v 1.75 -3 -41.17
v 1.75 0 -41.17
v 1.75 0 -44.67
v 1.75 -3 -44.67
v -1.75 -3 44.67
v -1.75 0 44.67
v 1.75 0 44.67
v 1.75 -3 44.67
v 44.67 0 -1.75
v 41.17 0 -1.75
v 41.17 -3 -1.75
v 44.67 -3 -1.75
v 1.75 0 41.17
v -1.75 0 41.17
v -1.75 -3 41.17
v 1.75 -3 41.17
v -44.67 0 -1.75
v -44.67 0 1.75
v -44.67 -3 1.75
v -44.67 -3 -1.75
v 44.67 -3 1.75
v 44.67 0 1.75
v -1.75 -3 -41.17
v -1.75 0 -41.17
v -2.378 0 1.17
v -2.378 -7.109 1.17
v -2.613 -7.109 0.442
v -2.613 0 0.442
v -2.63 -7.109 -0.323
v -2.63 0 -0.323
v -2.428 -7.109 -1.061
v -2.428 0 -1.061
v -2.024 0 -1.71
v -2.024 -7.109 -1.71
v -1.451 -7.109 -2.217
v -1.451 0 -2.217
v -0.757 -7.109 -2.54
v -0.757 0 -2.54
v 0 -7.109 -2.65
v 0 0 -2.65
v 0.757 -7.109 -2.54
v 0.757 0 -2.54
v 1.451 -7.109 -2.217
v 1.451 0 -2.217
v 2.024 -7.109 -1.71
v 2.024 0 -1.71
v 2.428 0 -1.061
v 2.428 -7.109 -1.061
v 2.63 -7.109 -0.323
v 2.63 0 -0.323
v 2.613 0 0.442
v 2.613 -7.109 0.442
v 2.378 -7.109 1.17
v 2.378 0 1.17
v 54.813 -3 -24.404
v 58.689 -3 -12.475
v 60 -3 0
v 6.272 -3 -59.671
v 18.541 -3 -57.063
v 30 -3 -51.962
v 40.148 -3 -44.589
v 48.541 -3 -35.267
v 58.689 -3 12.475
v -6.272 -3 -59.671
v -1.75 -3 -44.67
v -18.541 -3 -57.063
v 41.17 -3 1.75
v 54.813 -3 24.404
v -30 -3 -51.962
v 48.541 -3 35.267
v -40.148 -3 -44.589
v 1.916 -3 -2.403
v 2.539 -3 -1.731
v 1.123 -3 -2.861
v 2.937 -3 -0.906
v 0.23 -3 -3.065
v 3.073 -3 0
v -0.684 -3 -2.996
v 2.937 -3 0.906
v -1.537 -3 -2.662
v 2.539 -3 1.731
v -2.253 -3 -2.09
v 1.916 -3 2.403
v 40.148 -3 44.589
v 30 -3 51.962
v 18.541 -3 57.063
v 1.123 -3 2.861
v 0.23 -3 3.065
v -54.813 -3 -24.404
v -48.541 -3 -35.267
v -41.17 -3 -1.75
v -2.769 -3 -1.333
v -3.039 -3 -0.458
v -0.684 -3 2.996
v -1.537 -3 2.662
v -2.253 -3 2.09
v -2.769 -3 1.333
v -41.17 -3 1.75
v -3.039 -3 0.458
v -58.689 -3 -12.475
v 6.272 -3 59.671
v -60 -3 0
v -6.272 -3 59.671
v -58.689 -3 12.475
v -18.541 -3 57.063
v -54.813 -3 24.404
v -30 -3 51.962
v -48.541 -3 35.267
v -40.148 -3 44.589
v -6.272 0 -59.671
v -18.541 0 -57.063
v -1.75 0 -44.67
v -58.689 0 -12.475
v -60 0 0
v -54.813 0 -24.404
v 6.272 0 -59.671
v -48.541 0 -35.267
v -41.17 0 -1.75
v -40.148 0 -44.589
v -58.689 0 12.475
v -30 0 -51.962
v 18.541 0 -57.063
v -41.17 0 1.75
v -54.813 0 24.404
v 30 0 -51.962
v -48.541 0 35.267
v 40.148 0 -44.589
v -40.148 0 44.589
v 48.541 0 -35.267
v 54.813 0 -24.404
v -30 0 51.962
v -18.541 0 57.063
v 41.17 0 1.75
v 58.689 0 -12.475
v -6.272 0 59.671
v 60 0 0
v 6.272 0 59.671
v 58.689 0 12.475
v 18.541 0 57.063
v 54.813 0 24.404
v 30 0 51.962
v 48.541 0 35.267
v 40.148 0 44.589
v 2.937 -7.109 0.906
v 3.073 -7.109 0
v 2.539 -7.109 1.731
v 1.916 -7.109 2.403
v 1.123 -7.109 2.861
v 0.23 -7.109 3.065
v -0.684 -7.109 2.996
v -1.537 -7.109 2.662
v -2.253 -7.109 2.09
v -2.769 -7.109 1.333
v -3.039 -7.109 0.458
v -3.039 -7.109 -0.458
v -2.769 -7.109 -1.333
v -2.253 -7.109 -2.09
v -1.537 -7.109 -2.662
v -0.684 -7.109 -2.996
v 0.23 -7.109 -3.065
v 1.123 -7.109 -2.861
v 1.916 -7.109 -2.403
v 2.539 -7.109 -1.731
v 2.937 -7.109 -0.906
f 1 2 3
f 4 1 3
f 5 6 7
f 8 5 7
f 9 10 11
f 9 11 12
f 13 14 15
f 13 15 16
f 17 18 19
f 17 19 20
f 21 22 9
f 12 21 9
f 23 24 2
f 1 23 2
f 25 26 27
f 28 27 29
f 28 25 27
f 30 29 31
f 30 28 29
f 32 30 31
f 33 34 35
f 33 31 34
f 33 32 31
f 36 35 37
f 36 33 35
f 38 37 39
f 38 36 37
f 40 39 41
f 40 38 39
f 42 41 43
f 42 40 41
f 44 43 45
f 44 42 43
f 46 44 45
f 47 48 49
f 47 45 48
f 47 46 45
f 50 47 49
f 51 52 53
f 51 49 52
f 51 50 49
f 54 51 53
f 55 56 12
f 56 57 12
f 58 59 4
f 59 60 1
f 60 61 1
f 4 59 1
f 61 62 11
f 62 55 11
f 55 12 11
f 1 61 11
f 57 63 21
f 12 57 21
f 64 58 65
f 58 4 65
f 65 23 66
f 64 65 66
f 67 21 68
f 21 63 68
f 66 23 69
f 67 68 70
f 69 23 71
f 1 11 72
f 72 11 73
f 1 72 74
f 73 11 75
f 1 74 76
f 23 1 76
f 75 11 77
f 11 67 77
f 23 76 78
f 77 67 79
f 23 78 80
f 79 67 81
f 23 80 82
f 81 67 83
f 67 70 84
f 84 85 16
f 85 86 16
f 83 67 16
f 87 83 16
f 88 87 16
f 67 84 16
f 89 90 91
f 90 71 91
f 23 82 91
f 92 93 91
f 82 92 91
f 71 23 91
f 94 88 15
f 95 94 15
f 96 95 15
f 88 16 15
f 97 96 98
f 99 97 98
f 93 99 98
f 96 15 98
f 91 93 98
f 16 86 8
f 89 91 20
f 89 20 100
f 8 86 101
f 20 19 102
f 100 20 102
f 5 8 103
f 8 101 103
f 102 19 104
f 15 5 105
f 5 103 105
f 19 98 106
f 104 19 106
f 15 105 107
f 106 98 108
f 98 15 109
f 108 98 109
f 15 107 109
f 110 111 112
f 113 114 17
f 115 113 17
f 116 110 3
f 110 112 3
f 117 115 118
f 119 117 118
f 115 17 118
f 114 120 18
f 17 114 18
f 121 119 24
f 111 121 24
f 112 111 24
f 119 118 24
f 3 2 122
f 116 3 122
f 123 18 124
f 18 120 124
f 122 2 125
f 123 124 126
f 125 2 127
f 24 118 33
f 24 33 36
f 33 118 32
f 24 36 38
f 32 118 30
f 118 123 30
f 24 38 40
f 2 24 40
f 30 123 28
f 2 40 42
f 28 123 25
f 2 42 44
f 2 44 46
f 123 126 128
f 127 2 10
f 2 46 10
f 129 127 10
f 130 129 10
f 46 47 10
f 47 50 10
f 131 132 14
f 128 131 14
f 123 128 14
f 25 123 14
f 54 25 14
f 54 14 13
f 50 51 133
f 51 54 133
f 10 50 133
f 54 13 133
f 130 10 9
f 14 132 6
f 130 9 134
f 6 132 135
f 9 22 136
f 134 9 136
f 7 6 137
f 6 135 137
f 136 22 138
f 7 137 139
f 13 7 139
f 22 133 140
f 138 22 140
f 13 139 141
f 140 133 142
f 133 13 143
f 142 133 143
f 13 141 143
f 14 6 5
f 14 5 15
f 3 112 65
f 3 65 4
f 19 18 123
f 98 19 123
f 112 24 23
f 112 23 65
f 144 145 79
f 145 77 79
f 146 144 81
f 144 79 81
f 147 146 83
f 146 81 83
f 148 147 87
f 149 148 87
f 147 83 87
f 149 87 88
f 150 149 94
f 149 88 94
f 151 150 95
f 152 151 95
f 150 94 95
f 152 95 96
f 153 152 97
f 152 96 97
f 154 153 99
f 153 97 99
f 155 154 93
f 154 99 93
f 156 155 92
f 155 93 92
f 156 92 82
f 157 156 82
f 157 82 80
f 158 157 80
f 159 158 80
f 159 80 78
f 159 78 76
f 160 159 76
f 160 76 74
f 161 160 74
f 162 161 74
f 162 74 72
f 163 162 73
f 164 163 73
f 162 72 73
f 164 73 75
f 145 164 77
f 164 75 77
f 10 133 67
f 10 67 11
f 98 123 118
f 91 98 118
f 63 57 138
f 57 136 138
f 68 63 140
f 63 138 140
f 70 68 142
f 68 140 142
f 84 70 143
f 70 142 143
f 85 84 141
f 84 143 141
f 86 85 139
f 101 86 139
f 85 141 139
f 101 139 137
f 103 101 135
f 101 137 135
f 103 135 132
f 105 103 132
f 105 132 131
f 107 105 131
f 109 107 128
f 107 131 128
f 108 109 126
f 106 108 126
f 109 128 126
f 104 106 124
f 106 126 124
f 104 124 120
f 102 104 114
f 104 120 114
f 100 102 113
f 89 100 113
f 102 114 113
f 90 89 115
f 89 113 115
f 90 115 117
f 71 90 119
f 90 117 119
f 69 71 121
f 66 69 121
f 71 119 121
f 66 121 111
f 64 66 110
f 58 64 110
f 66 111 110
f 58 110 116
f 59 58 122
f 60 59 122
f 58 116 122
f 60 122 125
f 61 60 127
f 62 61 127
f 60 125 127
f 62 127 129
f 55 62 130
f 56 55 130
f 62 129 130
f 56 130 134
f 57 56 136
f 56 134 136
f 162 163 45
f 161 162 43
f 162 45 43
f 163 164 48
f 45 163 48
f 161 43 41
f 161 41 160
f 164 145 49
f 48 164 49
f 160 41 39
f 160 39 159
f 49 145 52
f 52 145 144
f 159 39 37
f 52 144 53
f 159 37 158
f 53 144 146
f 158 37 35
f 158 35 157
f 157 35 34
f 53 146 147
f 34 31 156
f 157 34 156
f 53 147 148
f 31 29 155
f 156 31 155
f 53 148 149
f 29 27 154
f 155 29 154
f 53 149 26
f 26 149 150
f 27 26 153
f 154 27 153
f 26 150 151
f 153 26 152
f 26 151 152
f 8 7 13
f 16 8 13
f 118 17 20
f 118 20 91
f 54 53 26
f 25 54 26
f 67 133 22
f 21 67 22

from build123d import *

# Parameters (mm, degrees)
SKETCH2_W          = 3.5
SKETCH2_H          = 3.5
CUT_EXTRUDE1_DEPTH = 8.1086


with BuildPart() as part:
    # Sketch1 → Revolve1 (revolve)
    with BuildSketch(Plane.XY):
        Polygon((1.957910998, 0), (0, 0), (0, -2.01497422), (0, -7.1086), (3.0734, -7.1086), (3.0734, -3), (60, -3), (60, 0), align=None)
    revolve(axis=Axis((0, 0, 0), (0, -1, 0)))

    # Sketch2 → Cut-Extrude1 (cut, through all)
    with BuildSketch(Plane(origin=(0, 0, 0), x_dir=(1, 0, 0), z_dir=(0, 1, 0))):
        with BuildLine():
            Line((2.37773001, -1.17), (-2.37773001, -1.17))
            ThreePointArc((-2.37773001, -1.17), (0, 2.65), (2.37773001, -1.17))
        make_face()
        with Locations((-42.92, 0)):
            Rectangle(SKETCH2_W, SKETCH2_H)
        with Locations((0, -42.92)):
            Rectangle(SKETCH2_W, SKETCH2_H)
        with Locations((0, 42.92)):
            Rectangle(SKETCH2_W, SKETCH2_H)
        with Locations((42.92, 0)):
            Rectangle(SKETCH2_W, SKETCH2_H)
    extrude(amount=-CUT_EXTRUDE1_DEPTH, mode=Mode.SUBTRACT)


solid = part.part
